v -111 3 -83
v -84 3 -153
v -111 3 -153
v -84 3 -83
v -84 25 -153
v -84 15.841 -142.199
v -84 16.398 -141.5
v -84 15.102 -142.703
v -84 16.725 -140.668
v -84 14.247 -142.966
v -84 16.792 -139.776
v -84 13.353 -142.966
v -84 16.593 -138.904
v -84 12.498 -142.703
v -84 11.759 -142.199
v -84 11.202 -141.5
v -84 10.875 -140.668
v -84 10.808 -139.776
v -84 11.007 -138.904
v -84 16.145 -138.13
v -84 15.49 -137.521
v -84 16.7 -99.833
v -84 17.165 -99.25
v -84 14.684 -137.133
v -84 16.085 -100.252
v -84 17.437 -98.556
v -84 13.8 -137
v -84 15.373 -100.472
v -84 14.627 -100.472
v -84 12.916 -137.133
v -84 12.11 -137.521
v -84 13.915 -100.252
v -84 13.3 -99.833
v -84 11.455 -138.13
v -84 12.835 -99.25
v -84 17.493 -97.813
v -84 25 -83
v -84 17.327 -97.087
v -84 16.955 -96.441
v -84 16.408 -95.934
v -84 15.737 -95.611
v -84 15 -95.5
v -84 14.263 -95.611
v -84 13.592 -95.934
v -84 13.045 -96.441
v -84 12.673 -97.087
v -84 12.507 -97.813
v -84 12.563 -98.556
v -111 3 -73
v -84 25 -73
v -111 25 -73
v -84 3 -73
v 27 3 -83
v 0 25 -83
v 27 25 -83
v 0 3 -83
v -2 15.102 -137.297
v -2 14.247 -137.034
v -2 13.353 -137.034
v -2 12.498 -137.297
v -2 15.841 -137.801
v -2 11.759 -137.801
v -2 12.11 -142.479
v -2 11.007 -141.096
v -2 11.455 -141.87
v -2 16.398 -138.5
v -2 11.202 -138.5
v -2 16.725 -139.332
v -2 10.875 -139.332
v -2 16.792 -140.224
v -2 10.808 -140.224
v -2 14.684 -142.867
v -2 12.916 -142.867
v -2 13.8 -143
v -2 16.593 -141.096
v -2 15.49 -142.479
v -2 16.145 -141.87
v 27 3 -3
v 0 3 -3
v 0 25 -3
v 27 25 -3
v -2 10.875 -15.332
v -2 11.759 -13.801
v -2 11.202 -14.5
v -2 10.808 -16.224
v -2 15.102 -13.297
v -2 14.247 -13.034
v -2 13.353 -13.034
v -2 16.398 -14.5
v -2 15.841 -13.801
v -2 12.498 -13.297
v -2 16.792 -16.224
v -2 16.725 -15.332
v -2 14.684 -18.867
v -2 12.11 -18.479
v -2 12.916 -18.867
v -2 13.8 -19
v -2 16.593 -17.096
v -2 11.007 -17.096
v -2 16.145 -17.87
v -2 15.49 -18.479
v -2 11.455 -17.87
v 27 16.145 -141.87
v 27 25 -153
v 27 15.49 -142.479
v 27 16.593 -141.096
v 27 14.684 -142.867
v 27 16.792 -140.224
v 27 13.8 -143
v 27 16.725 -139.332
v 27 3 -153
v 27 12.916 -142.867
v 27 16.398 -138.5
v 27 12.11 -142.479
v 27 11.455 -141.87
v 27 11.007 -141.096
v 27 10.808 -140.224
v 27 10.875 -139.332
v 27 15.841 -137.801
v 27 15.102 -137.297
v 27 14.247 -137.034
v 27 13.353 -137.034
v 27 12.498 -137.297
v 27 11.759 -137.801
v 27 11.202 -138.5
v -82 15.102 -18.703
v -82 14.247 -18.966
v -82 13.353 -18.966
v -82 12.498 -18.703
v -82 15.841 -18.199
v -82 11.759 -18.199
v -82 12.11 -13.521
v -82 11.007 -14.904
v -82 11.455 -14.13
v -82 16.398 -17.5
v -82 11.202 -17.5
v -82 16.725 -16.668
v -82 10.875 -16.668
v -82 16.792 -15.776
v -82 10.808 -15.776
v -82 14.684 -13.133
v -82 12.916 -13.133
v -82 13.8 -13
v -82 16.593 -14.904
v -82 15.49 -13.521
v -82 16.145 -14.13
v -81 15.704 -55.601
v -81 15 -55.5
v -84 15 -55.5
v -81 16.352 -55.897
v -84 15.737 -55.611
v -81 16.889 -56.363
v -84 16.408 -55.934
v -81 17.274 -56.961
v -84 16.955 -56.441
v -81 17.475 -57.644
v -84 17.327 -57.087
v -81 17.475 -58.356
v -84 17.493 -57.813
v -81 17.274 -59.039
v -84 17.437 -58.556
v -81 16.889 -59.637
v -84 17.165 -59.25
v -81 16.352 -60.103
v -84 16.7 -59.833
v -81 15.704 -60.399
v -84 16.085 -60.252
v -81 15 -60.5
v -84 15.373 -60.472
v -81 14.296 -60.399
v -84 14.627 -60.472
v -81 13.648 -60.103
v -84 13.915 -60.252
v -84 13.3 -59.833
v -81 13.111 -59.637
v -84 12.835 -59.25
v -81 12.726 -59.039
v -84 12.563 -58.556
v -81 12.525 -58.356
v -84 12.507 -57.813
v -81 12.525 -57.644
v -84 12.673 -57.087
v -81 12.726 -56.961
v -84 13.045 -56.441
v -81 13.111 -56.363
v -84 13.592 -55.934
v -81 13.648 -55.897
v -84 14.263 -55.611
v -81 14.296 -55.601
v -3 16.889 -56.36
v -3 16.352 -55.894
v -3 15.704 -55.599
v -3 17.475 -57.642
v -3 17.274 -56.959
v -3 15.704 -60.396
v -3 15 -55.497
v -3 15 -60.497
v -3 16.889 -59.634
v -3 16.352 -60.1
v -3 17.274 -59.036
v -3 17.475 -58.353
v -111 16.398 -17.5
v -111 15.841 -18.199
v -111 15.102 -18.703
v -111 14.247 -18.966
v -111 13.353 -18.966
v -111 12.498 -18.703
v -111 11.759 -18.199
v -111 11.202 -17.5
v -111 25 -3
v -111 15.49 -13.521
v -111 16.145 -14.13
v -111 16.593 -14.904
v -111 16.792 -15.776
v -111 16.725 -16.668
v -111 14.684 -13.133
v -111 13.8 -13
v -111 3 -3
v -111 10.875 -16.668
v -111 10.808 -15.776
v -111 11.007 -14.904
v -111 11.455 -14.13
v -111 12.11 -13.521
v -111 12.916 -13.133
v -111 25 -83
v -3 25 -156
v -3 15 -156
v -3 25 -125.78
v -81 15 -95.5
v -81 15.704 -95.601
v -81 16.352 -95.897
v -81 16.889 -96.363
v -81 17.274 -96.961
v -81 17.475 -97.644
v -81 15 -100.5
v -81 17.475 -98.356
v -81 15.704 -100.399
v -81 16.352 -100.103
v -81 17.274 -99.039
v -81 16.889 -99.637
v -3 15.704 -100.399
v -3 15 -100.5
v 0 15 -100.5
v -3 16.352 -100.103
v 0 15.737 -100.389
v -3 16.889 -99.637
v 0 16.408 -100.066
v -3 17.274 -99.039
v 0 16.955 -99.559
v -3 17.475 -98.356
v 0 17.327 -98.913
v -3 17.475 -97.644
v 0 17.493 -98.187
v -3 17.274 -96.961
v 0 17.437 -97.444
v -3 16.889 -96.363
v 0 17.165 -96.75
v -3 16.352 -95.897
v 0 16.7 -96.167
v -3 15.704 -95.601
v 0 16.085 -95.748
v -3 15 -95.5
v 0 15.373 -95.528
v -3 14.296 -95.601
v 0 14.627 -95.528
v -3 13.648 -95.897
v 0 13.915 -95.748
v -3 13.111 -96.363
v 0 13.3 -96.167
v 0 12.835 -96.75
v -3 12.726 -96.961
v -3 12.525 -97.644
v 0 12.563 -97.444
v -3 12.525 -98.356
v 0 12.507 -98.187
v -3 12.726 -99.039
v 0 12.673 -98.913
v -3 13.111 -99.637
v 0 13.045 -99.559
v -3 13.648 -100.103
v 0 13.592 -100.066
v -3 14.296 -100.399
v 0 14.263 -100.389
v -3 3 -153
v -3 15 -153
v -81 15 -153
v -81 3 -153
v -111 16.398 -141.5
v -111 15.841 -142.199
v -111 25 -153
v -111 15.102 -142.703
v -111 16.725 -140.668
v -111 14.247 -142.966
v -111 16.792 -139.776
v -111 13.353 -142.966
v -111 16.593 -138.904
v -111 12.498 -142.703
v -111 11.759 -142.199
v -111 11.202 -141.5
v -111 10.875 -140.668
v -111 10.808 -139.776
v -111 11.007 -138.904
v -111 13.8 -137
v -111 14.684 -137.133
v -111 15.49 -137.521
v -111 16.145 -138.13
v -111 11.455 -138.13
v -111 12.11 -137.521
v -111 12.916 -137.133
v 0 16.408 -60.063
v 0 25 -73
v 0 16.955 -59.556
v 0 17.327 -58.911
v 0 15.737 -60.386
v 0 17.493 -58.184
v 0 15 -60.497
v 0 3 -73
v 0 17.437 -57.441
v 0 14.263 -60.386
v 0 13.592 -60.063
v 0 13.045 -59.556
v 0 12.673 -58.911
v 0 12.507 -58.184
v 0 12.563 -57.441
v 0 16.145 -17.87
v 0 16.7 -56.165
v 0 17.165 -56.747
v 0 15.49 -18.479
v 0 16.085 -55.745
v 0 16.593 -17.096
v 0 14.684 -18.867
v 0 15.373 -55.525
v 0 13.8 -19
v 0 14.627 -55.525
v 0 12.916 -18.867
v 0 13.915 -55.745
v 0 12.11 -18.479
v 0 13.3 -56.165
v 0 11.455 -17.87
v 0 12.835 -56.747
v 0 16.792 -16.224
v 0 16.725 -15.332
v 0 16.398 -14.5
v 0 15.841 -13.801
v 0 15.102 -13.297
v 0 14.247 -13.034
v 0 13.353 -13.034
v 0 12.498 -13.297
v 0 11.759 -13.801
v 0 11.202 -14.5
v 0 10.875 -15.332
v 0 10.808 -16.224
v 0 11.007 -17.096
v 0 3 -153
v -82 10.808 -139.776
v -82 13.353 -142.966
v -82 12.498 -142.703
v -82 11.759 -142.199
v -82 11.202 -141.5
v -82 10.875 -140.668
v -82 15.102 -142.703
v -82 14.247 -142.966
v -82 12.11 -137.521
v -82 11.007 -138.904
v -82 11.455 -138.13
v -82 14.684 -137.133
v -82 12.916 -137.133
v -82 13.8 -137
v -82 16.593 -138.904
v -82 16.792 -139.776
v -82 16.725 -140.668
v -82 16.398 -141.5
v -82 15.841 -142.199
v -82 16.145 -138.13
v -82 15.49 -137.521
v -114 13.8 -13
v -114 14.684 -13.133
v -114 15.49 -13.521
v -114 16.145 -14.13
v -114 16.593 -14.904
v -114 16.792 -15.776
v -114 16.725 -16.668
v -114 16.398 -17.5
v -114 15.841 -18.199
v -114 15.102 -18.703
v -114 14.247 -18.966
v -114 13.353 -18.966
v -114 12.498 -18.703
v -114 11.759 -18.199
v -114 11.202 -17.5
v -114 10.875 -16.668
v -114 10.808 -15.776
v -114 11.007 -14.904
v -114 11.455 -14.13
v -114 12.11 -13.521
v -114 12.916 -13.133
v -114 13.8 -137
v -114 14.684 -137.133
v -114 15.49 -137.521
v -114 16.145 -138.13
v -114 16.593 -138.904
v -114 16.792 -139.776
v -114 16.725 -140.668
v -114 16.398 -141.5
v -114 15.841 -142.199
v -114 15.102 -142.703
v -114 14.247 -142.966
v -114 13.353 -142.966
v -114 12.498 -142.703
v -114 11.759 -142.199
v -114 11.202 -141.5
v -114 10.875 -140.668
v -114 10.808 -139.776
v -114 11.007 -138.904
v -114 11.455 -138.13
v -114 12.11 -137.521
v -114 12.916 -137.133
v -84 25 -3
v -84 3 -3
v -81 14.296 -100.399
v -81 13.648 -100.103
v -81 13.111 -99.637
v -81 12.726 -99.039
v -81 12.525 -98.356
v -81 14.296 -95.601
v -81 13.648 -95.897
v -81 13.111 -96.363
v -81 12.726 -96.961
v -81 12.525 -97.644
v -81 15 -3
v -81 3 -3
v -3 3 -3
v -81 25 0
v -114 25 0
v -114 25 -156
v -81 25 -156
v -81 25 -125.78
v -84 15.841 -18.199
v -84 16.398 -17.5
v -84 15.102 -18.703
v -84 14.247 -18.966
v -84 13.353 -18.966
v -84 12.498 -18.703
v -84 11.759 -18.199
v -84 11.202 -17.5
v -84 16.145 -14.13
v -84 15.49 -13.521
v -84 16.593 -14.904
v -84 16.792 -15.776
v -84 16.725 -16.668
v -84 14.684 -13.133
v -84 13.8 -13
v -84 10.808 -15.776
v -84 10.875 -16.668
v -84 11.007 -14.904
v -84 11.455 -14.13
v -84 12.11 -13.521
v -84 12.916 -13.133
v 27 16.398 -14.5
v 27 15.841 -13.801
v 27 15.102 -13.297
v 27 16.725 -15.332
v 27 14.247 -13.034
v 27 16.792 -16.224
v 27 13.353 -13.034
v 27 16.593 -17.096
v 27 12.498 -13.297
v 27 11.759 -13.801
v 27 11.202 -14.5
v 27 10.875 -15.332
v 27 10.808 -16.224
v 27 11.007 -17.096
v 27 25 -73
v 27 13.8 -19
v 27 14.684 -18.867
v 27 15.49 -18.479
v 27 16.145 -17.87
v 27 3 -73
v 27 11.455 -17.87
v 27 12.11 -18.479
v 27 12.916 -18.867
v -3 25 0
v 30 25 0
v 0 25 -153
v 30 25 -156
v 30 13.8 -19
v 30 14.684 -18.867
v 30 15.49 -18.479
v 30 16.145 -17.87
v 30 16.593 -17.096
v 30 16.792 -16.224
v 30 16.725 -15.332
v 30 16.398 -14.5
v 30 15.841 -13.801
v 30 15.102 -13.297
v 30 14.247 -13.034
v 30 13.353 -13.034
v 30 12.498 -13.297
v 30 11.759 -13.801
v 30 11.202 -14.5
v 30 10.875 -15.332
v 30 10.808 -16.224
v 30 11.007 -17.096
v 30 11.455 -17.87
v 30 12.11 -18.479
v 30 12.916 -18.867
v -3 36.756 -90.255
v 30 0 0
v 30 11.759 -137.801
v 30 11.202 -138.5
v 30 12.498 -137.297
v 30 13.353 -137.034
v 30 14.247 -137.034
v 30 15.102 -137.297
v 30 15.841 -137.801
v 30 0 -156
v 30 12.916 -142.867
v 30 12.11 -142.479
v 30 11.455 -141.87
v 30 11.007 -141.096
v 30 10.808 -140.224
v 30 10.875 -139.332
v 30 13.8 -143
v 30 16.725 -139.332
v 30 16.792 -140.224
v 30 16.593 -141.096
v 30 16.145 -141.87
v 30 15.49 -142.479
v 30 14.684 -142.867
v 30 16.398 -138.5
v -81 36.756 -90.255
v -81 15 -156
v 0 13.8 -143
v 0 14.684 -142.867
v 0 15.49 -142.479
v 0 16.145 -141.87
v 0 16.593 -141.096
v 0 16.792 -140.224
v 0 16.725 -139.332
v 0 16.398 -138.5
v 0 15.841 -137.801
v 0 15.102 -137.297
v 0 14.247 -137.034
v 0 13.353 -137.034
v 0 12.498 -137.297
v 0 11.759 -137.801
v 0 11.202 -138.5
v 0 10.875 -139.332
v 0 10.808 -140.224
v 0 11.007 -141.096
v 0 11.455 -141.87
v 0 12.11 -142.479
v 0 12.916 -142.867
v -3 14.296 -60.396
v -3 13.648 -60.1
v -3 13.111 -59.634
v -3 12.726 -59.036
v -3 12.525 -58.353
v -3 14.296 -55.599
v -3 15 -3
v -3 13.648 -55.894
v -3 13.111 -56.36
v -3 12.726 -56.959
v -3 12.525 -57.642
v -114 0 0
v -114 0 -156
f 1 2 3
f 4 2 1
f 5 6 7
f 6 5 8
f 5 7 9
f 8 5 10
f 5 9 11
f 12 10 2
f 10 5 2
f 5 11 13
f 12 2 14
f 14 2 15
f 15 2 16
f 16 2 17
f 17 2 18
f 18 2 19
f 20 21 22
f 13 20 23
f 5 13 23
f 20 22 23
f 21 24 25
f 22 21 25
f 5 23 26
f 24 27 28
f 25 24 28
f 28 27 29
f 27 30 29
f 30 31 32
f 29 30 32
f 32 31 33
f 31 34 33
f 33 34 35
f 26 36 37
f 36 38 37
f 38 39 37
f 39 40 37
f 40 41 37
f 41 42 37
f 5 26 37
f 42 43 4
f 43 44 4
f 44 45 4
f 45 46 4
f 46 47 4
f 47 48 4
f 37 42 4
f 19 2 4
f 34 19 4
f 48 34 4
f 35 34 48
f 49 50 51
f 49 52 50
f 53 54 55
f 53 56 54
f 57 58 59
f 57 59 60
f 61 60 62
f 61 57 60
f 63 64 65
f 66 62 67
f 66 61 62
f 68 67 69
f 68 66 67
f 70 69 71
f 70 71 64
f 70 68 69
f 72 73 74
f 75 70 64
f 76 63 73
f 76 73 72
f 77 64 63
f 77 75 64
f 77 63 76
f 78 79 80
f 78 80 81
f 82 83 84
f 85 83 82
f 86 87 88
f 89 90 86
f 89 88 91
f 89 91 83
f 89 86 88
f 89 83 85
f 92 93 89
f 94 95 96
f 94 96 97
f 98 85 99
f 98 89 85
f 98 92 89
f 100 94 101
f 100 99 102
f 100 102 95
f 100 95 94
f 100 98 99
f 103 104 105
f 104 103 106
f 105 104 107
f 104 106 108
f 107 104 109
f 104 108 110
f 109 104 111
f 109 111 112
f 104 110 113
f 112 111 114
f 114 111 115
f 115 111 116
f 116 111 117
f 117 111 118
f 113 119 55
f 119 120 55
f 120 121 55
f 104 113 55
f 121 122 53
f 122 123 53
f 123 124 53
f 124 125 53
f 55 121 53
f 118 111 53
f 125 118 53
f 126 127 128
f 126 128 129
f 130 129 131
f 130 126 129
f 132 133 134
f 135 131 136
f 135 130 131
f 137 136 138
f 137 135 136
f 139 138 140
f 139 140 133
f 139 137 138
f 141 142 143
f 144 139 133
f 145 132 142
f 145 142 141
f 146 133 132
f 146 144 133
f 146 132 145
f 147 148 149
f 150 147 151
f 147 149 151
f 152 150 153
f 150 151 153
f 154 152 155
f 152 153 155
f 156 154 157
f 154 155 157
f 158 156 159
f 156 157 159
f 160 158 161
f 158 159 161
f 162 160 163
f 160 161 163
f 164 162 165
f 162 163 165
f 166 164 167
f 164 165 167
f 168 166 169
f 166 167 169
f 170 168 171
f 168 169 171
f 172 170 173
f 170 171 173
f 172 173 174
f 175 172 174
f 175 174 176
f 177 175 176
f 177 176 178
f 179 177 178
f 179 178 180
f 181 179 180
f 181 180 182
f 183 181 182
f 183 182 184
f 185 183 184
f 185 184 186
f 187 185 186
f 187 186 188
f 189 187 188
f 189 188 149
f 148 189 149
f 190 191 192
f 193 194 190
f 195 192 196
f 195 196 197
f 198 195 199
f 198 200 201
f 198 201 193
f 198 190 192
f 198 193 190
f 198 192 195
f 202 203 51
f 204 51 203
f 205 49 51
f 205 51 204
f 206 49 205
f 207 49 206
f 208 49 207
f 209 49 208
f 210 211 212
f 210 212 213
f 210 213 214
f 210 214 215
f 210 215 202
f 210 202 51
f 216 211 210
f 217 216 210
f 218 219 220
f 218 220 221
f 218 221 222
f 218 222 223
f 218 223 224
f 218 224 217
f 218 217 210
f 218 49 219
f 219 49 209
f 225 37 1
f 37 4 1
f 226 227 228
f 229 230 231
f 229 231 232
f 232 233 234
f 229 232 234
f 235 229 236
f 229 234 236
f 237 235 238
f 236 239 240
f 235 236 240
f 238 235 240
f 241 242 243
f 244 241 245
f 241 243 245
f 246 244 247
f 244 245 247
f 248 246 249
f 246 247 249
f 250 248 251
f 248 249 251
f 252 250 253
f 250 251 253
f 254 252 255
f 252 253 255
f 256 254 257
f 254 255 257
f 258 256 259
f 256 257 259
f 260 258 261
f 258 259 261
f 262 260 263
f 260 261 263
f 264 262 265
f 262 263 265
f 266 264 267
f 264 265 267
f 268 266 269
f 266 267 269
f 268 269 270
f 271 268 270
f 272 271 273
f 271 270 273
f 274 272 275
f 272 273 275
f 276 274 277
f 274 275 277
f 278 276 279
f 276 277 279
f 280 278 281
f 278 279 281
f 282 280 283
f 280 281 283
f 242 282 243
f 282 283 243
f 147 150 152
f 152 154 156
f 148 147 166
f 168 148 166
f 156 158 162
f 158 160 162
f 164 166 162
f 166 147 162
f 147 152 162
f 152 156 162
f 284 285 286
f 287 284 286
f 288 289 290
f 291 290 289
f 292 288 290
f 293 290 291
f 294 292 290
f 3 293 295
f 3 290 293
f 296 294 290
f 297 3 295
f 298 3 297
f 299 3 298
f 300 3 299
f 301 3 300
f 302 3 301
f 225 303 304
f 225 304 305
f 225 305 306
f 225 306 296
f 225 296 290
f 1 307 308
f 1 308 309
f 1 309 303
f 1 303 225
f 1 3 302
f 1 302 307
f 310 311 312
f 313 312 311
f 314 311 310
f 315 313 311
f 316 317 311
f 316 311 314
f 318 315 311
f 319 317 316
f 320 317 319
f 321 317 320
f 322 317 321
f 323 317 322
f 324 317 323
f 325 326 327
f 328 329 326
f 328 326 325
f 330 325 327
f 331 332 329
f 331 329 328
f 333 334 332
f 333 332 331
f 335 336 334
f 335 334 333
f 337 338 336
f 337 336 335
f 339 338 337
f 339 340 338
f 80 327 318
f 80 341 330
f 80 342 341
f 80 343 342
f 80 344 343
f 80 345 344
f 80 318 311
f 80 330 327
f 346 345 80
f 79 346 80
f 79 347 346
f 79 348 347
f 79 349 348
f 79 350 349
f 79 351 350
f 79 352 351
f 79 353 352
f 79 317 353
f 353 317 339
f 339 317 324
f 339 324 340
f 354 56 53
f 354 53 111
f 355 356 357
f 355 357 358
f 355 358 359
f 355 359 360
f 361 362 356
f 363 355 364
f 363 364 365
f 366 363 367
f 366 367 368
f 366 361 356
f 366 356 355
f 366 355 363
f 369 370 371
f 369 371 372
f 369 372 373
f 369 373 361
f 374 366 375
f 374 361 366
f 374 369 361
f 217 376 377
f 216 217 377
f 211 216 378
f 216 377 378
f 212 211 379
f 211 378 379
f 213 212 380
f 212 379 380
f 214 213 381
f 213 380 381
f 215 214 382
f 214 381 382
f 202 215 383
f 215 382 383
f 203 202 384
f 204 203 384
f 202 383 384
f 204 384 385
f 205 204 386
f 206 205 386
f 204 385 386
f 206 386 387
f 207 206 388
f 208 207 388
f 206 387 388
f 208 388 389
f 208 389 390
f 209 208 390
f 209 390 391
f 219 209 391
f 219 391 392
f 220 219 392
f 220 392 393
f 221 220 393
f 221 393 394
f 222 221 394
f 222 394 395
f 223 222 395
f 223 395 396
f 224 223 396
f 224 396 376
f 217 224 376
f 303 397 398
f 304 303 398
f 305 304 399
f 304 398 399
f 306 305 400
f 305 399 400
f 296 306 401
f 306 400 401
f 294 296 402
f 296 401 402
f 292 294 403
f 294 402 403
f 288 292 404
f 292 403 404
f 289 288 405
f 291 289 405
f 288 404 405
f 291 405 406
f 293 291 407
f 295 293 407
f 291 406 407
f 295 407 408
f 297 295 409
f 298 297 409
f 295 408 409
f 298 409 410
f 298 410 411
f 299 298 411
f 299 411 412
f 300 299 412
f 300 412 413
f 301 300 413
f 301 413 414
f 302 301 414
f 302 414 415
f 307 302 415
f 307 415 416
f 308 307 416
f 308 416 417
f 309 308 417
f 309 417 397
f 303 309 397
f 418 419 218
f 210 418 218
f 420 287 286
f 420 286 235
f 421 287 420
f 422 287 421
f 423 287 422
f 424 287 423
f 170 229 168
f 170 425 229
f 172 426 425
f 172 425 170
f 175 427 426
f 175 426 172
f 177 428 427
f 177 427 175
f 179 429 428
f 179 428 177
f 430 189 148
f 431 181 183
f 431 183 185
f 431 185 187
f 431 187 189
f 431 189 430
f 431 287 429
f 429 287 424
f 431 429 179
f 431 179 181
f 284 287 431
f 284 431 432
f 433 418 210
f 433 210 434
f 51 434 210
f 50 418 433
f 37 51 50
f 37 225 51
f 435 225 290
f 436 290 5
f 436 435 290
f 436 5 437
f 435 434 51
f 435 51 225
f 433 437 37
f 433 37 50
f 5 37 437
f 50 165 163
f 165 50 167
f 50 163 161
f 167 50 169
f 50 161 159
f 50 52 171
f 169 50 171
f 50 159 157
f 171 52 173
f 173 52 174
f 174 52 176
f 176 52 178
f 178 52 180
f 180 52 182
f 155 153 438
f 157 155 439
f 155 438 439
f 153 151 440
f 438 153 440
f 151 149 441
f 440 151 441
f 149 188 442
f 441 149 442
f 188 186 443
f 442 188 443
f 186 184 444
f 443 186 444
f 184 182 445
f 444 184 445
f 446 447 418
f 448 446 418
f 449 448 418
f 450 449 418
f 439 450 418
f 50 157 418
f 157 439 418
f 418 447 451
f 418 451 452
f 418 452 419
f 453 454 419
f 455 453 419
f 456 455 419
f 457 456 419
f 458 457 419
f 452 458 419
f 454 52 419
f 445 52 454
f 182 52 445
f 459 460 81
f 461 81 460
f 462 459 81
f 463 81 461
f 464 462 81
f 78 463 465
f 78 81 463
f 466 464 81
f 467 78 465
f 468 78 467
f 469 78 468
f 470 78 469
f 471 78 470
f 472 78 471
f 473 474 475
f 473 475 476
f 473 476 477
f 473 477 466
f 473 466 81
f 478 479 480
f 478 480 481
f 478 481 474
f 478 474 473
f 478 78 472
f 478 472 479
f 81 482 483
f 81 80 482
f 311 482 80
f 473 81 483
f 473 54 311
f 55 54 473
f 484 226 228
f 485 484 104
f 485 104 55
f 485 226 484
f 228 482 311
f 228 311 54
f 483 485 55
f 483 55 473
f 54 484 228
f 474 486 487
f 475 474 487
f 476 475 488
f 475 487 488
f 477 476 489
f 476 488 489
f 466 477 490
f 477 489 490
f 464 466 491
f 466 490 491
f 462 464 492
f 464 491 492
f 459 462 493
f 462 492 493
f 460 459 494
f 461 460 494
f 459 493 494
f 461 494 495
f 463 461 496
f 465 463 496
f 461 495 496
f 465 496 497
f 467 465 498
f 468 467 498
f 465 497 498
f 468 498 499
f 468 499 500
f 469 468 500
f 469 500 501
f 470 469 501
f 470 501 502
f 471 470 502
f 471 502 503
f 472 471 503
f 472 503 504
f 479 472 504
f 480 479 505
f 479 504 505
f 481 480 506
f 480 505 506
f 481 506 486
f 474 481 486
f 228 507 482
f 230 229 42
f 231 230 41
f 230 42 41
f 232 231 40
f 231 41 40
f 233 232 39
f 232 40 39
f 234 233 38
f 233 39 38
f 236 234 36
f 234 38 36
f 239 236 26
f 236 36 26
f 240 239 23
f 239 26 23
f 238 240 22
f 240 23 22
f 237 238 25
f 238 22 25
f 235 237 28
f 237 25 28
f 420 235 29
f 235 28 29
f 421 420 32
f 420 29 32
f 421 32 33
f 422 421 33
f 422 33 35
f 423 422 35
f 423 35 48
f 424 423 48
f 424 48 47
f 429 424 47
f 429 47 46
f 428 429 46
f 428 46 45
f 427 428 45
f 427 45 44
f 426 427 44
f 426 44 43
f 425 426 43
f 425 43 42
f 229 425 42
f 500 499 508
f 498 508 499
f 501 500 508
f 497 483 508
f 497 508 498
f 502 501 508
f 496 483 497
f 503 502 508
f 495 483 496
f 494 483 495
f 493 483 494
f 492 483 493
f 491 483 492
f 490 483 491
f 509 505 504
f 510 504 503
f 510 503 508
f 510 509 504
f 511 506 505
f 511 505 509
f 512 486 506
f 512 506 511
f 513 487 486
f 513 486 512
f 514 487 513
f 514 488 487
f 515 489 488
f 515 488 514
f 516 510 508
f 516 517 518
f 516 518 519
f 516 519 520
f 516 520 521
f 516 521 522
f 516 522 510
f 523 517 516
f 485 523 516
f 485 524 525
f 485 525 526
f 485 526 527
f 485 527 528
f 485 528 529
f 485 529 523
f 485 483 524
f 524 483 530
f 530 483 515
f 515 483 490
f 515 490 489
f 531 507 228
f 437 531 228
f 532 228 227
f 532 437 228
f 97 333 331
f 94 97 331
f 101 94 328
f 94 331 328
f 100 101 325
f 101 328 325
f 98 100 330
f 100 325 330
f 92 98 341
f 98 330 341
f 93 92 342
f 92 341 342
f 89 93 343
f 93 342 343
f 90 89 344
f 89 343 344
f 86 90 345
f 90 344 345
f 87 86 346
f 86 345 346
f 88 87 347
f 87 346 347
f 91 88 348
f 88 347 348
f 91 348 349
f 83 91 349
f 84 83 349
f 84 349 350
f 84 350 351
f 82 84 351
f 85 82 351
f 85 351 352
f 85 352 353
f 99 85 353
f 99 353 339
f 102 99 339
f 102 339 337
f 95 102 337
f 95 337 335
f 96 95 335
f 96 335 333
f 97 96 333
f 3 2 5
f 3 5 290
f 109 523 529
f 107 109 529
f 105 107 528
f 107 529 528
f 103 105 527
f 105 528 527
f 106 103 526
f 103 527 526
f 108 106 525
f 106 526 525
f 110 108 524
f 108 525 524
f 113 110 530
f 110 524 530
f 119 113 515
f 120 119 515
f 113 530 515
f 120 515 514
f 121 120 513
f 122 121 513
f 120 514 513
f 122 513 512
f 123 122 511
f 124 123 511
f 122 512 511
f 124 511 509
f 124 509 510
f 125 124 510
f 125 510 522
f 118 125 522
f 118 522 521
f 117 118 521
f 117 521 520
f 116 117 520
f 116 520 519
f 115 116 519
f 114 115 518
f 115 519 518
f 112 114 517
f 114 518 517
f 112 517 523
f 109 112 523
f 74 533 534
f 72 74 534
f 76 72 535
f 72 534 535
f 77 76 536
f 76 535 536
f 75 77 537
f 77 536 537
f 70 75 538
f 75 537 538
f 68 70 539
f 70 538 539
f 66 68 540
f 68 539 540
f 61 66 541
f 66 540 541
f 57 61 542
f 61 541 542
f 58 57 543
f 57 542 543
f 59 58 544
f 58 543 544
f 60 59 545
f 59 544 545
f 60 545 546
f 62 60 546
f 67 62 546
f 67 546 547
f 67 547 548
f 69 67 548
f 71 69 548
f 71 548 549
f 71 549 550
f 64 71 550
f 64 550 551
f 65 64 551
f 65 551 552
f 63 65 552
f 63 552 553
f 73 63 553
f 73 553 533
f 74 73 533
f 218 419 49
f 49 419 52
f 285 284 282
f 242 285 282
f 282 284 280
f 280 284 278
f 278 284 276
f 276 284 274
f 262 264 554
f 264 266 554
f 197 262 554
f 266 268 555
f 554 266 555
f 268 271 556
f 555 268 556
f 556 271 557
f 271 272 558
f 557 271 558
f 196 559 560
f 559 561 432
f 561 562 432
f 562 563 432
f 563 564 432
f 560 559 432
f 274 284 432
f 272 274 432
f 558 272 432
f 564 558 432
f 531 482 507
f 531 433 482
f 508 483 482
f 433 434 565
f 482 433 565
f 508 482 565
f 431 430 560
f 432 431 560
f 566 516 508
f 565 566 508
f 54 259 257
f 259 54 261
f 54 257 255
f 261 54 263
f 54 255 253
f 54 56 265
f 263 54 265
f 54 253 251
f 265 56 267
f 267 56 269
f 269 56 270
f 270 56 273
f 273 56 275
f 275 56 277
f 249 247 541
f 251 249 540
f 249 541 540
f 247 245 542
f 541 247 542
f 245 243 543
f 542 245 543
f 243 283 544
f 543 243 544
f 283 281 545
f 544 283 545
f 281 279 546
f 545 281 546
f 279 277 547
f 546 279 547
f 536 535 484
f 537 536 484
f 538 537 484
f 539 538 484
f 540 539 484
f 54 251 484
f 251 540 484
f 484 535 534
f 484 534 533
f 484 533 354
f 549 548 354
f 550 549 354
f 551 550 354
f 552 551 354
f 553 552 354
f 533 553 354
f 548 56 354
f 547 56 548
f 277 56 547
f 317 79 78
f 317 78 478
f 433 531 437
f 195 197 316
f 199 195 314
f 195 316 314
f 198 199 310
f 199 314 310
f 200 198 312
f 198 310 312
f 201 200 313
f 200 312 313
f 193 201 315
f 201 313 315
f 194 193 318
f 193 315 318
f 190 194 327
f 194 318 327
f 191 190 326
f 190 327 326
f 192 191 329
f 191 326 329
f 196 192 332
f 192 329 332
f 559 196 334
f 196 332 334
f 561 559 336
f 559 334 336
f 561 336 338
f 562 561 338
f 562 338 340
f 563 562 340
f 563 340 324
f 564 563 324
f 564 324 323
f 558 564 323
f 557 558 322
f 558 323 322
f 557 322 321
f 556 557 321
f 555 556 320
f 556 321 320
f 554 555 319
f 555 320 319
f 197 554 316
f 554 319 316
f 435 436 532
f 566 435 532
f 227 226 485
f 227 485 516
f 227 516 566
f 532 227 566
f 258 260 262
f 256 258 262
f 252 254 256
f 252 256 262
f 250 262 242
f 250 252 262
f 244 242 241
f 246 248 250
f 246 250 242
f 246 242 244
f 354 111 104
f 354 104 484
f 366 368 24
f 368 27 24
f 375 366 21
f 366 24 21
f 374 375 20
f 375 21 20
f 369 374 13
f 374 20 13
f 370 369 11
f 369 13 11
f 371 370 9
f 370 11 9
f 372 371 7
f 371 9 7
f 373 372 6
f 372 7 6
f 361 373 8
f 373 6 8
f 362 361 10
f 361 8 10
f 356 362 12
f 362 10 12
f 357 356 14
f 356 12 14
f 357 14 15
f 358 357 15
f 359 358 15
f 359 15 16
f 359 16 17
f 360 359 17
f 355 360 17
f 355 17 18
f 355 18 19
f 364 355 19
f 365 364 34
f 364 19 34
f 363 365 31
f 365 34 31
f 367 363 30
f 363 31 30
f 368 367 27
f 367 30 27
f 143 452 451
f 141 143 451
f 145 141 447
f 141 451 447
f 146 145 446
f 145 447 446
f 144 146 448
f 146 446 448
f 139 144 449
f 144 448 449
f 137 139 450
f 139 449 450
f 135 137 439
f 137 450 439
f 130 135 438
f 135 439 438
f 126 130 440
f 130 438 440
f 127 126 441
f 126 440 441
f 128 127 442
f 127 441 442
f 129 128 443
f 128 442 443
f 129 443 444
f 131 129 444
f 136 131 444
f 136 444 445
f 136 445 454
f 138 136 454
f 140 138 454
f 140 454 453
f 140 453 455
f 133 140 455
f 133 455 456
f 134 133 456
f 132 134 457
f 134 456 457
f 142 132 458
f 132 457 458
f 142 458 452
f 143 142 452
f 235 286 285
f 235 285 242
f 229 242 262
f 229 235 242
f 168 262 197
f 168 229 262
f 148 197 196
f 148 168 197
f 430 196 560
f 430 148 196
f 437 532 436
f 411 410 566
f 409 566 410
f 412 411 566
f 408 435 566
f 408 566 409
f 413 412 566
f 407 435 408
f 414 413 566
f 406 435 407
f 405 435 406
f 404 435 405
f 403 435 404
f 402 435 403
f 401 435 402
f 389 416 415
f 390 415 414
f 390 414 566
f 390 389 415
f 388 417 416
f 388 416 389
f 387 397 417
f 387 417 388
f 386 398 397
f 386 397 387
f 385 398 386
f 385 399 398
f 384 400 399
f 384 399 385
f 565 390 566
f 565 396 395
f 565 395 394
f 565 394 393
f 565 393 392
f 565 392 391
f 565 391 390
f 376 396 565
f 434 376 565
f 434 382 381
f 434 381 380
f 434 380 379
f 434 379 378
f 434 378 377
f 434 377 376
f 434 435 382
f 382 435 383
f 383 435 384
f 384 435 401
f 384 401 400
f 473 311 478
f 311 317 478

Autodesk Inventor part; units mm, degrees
ref_plane "YZ Plane" through (0, 0, 0) normal (1, 0, 0) x (0, 1, 0)
ref_plane "XZ Plane" through (0, 0, 0) normal (0, 1, 0) x (-1, 0, 0)
ref_plane "XY Plane" through (0, 0, 0) normal (0, 0, 1) x (1, 0, 0)
sketch "Sketch1" plane through (0, 0, 0) normal (0, 1, 0) x (-1, 0, 0)
  line L0 (0, 0) -> (84, 0)
  line L1 (84, 0) -> (84, -156)
  line L2 (84, -156) -> (0, -156)
  line L3 (0, -156) -> (0, 0)
  line L4 (84, 0) -> (84, -3)
  line L5 (84, -3) -> (81, -3) construction
  line L6 (0, -156) -> (0, -153)
  line L7 (0, -153) -> (3, -153) construction
  line L8 (81, -3) -> (3, -3)
  line L9 (3, -3) -> (3, -153)
  line L10 (3, -153) -> (81, -153)
  line L11 (81, -153) -> (81, -3)
  dimension "d0" = 84
  dimension "d1" = 156
  dimension "d2" = 3
  dimension "d3" = 3
  dimension "d4" = 3
  dimension "d5" = 3
extrude "Extrusion1" add sketch "Sketch1" along normal blind 15 contours L0 L1 L2 L3 | L11 L10 L9 L8
sketch "Sketch2" plane through (0, 15, 0) normal (0, 1, 0) x (1, 0, 0)
  line L0 (-84, 156) -> (-84, 0) projected
  line L1 (-84, 0) -> (-84, 3)
  line L2 (-84, 3) -> (-81, 3) construction
  line L3 (0, 0) -> (0, 156) projected
  line L4 (0, 156) -> (0, 153)
  line L5 (0, 153) -> (-3, 153) construction
  line L6 (-81, 3) -> (-3, 3)
  line L7 (-3, 3) -> (-3, 153)
  line L8 (-3, 153) -> (-81, 153)
  line L9 (-81, 153) -> (-81, 3)
  dimension "d8" = 3
  dimension "d9" = 3
  dimension "d10" = 3
  dimension "d11" = 3
extrude "Extrusion2" cut sketch "Sketch2" against normal blind 12
sketch "Sketch5" plane through (0, 0, 0) normal (1, 0, 0) x (0, 0, -1)
  line L0 (0, 15) -> (156, 15) projected
  line L1 (0, 15) -> (0, 0)
  line L2 (156, 0) -> (0, 0) projected
  line L3 (0, 0) -> (156, 0)
  line L4 (156, 0) -> (156, 15)
  line L5 (156, 15) -> (153, 15)
  line L6 (3, 3) -> (153, 3) projected
  line L7 (153, 15) -> (153, 3)
  line L8 (153, 3) -> (83, 3)
  line L9 (83, 3) -> (83, 15)
  line L10 (0, 15) -> (3, 15)
  line L11 (3, 15) -> (3, 3) projected
  line L12 (3, 15) -> (3, 3)
  line L13 (3, 3) -> (73, 3)
  line L14 (73, 3) -> (73, 15)
  line L15 (83, 15) -> (73, 15)
  dimension "d18" = 3
  dimension "d19" = 12
  dimension "d20" = 70
  dimension "d21" = 70
extrude "Extrusion3" add sketch "Sketch5" along normal blind 27 contours L0 L11 L6 L7 L4 L2 L1 | L0 L9 L6 L14
sketch "Sketch6" plane through (27, 0, 0) normal (1, 0, 0) x (0, 0, -1)
  line L0 (0, 15) -> (0, 0) projected
  line L1 (156, 0) -> (156, 15) projected
  line L2 (0, 0) -> (156, 0)
  line L3 (156, 0) -> (156, 15)
  line L4 (156, 15) -> (0, 15)
  line L5 (0, 15) -> (0, 0)
extrude "Extrusion4" add sketch "Sketch6" along normal blind 3
sketch "Sketch8" plane through (-84, 0, -156) normal (-1, 0, 0) x (0, 0, 1)
  line L0 (3, 15) -> (3, 3) projected
  line L1 (3, 15) -> (3, 3)
  line L2 (3, 3) -> (73, 3)
  line L3 (73, 3) -> (73, 15)
  line L4 (156, 15) -> (153, 15)
  line L5 (153, 15) -> (153, 3)
  line L6 (153, 3) -> (83, 3)
  line L7 (83, 3) -> (83, 15)
  line L8 (83, 15) -> (73, 15)
  line L9 (156, 0) -> (156, 15) projected
  line L10 (156, 15) -> (156, 0)
  line L11 (156, 0) -> (0, 0)
  line L12 (0, 0) -> (0, 15) projected
  line L13 (0, 0) -> (0, 15)
  line L14 (0, 15) -> (3, 15)
  dimension "d35" = 70
  dimension "d38" = 12
  dimension "d39" = 70
extrude "Extrusion5" add sketch "Sketch8" along normal blind 27
sketch "Sketch9" plane through (-111, 0, -156) normal (-1, 0, 0) x (0, 0, 1)
  line L0 (0, 0) -> (156, 0) projected
  line L1 (156, 15) -> (156, 0) projected
  line L2 (0, 0) -> (156, 0)
  line L3 (156, 0) -> (156, 15)
  line L4 (156, 15) -> (0, 15)
  line L5 (0, 15) -> (0, 0)
extrude "Extrusion6" add sketch "Sketch9" along normal blind 3
sketch "Sketch10" plane through (0, 15, 0) normal (0, 1, 0) x (1, 0, 0)
  line L0 (-3, 3) -> (-81, 3) projected
  line L1 (-3, 3) -> (-3, 0)
  line L2 (30, 0) -> (-114, 0) projected
  line L3 (30, 156) -> (30, 0) projected
  line L4 (30, 156) -> (-3, 156)
  line L5 (-3, 156) -> (-3, 0)
  line L6 (-3, 0) -> (30, 0)
  line L7 (30, 0) -> (30, 156)
  line L8 (-81, 3) -> (-81, 0)
  line L9 (-114, 156) -> (30, 156) projected
  line L10 (-114, 156) -> (-81, 156)
  line L11 (-81, 156) -> (-81, 0)
  line L12 (-81, 0) -> (-114, 0)
  line L13 (-114, 0) -> (-114, 156)
  line L14 (27, 153) -> (27, 83) projected
  line L15 (0, 83) -> (0, 153) projected
  line L16 (27, 153) -> (0, 153)
  line L17 (0, 153) -> (0, 83)
  line L18 (0, 83) -> (27, 83)
  line L19 (27, 83) -> (27, 153)
  line L20 (0, 73) -> (27, 73) projected
  line L21 (0, 3) -> (27, 3) projected
  line L22 (27, 73) -> (0, 73)
  line L23 (0, 73) -> (0, 3)
  line L24 (0, 3) -> (27, 3)
  line L25 (27, 3) -> (27, 73)
  line L26 (-84, 153) -> (-84, 83) projected
  line L27 (-84, 83) -> (-111, 83) projected
  line L28 (-84, 153) -> (-111, 153)
  line L29 (-111, 153) -> (-111, 83)
  line L30 (-111, 83) -> (-84, 83)
  line L31 (-84, 83) -> (-84, 153)
  line L32 (-84, 73) -> (-84, 3) projected
  line L33 (-84, 3) -> (-111, 3) projected
  line L34 (-84, 73) -> (-111, 73)
  line L35 (-111, 73) -> (-111, 3)
  line L36 (-111, 3) -> (-84, 3)
  line L37 (-84, 3) -> (-84, 73)
  point P0 (0, 0)
extrude "Extrusion7" add sketch "Sketch10" along normal blind 10 contours L5 L4 L3 L2 L1 | L8 L2 L13 L9 L11
sketch "Sketch11" plane through (-114, 0, -156) normal (-1, 0, 0) x (0, 0, 1)
  line L0 (0, 25) -> (16, 25)
  line L1 (16, 25) -> (16, 13.8)
  circle A0 centre (16, 13.8) radius 3
  line L2 (156, 15) -> (156, 25) projected
  line L3 (156, 25) -> (140, 25)
  line L4 (140, 25) -> (140, 13.8)
  circle A1 centre (140, 13.8) radius 3
  dimension "d117" = 16
  dimension "d118" = 11.2
  dimension "d119" = 6
  dimension "d120" = 16
  dimension "d121" = 11.2
  dimension "d122" = 6
extrude "Extrusion8" cut sketch "Sketch11" against normal blind 32
sketch "Sketch12" plane through (30, 0, 0) normal (1, 0, 0) x (0, 0, -1)
  line L0 (0, 25) -> (16, 25)
  line L1 (0, 25) -> (16, 25) construction
  line L2 (16, 25) -> (16, 13.8)
  circle A0 centre (16, 13.8) radius 3
  line L3 (156, 25) -> (140, 25)
  line L4 (140, 25) -> (140, 13.8)
  circle A1 centre (140, 13.8) radius 3
  dimension "d98" = 16
  dimension "d99" = 0
  dimension "d100" = 11.2
  dimension "d101" = 6
  dimension "d102" = 16
  dimension "d103" = 11.2
  dimension "d104" = 6
extrude "Extrusion9" cut sketch "Sketch12" against normal blind 32
sketch "Sketch13" plane through (0, 3, -3) normal (1, 0, 0) x (0, 0, -1)
  line L0 (0, 22) -> (70, 22) projected
  line L1 (0, 22) -> (55, 22)
  line L2 (55, 22) -> (54.9973, 12)
  circle A0 centre (54.9973, 12) radius 2.5
  line L3 (80, 22) -> (95, 22)
  line L4 (80, 22) -> (150, 22) projected
  line L5 (95, 22) -> (95, 12)
  circle A1 centre (95, 12) radius 2.5
  point P0 (-3, -3)
  dimension "d105" = 55
  dimension "d106" = 10
  dimension "d107" = 5
  dimension "d108" = 15
  dimension "d109" = 10
  dimension "d110" = 5
sketch "Sketch14" plane through (-84, 3, -153) normal (-1, 0, 0) x (0, 0, 1)
  line L0 (70, 0) -> (70, 22) projected
  line L1 (70, 22) -> (55, 22)
  line L2 (55, 22) -> (55, 12)
  circle A0 centre (55, 12) radius 2.5
  line L3 (80, 22) -> (95, 22)
  line L4 (95, 22) -> (95, 12)
  circle A1 centre (95, 12) radius 2.5
  point P0 (153, -3)
  point P1 (0, 22)
  point P2 (150, 22)
  dimension "d111" = 15
  dimension "d112" = 10
  dimension "d113" = 5
  dimension "d114" = 15
  dimension "d115" = 10
  dimension "d116" = 5
extrude "Extrusion10" cut sketch "Sketch14" against normal blind 10
extrude "Extrusion11" cut sketch "Sketch13" against normal blind 10
sketch "Sketch15" plane through (-81, 3, -3) normal (1, 0, 0) x (0, 0, -1)
  line L0 (-3, 22) -> (87.2546, 33.7556)
  line L1 (87.2546, 33.7556) -> (153, 12)
  line L2 (-3, 22) -> (-3, 12)
  line L3 (153, 12) -> (150, 12)
  line L4 (153, 12) -> (-3, 12)
extrude "Extrusion12" add sketch "Sketch15" along normal up to surface (78 mm away)
properties part number "prototype 1"
